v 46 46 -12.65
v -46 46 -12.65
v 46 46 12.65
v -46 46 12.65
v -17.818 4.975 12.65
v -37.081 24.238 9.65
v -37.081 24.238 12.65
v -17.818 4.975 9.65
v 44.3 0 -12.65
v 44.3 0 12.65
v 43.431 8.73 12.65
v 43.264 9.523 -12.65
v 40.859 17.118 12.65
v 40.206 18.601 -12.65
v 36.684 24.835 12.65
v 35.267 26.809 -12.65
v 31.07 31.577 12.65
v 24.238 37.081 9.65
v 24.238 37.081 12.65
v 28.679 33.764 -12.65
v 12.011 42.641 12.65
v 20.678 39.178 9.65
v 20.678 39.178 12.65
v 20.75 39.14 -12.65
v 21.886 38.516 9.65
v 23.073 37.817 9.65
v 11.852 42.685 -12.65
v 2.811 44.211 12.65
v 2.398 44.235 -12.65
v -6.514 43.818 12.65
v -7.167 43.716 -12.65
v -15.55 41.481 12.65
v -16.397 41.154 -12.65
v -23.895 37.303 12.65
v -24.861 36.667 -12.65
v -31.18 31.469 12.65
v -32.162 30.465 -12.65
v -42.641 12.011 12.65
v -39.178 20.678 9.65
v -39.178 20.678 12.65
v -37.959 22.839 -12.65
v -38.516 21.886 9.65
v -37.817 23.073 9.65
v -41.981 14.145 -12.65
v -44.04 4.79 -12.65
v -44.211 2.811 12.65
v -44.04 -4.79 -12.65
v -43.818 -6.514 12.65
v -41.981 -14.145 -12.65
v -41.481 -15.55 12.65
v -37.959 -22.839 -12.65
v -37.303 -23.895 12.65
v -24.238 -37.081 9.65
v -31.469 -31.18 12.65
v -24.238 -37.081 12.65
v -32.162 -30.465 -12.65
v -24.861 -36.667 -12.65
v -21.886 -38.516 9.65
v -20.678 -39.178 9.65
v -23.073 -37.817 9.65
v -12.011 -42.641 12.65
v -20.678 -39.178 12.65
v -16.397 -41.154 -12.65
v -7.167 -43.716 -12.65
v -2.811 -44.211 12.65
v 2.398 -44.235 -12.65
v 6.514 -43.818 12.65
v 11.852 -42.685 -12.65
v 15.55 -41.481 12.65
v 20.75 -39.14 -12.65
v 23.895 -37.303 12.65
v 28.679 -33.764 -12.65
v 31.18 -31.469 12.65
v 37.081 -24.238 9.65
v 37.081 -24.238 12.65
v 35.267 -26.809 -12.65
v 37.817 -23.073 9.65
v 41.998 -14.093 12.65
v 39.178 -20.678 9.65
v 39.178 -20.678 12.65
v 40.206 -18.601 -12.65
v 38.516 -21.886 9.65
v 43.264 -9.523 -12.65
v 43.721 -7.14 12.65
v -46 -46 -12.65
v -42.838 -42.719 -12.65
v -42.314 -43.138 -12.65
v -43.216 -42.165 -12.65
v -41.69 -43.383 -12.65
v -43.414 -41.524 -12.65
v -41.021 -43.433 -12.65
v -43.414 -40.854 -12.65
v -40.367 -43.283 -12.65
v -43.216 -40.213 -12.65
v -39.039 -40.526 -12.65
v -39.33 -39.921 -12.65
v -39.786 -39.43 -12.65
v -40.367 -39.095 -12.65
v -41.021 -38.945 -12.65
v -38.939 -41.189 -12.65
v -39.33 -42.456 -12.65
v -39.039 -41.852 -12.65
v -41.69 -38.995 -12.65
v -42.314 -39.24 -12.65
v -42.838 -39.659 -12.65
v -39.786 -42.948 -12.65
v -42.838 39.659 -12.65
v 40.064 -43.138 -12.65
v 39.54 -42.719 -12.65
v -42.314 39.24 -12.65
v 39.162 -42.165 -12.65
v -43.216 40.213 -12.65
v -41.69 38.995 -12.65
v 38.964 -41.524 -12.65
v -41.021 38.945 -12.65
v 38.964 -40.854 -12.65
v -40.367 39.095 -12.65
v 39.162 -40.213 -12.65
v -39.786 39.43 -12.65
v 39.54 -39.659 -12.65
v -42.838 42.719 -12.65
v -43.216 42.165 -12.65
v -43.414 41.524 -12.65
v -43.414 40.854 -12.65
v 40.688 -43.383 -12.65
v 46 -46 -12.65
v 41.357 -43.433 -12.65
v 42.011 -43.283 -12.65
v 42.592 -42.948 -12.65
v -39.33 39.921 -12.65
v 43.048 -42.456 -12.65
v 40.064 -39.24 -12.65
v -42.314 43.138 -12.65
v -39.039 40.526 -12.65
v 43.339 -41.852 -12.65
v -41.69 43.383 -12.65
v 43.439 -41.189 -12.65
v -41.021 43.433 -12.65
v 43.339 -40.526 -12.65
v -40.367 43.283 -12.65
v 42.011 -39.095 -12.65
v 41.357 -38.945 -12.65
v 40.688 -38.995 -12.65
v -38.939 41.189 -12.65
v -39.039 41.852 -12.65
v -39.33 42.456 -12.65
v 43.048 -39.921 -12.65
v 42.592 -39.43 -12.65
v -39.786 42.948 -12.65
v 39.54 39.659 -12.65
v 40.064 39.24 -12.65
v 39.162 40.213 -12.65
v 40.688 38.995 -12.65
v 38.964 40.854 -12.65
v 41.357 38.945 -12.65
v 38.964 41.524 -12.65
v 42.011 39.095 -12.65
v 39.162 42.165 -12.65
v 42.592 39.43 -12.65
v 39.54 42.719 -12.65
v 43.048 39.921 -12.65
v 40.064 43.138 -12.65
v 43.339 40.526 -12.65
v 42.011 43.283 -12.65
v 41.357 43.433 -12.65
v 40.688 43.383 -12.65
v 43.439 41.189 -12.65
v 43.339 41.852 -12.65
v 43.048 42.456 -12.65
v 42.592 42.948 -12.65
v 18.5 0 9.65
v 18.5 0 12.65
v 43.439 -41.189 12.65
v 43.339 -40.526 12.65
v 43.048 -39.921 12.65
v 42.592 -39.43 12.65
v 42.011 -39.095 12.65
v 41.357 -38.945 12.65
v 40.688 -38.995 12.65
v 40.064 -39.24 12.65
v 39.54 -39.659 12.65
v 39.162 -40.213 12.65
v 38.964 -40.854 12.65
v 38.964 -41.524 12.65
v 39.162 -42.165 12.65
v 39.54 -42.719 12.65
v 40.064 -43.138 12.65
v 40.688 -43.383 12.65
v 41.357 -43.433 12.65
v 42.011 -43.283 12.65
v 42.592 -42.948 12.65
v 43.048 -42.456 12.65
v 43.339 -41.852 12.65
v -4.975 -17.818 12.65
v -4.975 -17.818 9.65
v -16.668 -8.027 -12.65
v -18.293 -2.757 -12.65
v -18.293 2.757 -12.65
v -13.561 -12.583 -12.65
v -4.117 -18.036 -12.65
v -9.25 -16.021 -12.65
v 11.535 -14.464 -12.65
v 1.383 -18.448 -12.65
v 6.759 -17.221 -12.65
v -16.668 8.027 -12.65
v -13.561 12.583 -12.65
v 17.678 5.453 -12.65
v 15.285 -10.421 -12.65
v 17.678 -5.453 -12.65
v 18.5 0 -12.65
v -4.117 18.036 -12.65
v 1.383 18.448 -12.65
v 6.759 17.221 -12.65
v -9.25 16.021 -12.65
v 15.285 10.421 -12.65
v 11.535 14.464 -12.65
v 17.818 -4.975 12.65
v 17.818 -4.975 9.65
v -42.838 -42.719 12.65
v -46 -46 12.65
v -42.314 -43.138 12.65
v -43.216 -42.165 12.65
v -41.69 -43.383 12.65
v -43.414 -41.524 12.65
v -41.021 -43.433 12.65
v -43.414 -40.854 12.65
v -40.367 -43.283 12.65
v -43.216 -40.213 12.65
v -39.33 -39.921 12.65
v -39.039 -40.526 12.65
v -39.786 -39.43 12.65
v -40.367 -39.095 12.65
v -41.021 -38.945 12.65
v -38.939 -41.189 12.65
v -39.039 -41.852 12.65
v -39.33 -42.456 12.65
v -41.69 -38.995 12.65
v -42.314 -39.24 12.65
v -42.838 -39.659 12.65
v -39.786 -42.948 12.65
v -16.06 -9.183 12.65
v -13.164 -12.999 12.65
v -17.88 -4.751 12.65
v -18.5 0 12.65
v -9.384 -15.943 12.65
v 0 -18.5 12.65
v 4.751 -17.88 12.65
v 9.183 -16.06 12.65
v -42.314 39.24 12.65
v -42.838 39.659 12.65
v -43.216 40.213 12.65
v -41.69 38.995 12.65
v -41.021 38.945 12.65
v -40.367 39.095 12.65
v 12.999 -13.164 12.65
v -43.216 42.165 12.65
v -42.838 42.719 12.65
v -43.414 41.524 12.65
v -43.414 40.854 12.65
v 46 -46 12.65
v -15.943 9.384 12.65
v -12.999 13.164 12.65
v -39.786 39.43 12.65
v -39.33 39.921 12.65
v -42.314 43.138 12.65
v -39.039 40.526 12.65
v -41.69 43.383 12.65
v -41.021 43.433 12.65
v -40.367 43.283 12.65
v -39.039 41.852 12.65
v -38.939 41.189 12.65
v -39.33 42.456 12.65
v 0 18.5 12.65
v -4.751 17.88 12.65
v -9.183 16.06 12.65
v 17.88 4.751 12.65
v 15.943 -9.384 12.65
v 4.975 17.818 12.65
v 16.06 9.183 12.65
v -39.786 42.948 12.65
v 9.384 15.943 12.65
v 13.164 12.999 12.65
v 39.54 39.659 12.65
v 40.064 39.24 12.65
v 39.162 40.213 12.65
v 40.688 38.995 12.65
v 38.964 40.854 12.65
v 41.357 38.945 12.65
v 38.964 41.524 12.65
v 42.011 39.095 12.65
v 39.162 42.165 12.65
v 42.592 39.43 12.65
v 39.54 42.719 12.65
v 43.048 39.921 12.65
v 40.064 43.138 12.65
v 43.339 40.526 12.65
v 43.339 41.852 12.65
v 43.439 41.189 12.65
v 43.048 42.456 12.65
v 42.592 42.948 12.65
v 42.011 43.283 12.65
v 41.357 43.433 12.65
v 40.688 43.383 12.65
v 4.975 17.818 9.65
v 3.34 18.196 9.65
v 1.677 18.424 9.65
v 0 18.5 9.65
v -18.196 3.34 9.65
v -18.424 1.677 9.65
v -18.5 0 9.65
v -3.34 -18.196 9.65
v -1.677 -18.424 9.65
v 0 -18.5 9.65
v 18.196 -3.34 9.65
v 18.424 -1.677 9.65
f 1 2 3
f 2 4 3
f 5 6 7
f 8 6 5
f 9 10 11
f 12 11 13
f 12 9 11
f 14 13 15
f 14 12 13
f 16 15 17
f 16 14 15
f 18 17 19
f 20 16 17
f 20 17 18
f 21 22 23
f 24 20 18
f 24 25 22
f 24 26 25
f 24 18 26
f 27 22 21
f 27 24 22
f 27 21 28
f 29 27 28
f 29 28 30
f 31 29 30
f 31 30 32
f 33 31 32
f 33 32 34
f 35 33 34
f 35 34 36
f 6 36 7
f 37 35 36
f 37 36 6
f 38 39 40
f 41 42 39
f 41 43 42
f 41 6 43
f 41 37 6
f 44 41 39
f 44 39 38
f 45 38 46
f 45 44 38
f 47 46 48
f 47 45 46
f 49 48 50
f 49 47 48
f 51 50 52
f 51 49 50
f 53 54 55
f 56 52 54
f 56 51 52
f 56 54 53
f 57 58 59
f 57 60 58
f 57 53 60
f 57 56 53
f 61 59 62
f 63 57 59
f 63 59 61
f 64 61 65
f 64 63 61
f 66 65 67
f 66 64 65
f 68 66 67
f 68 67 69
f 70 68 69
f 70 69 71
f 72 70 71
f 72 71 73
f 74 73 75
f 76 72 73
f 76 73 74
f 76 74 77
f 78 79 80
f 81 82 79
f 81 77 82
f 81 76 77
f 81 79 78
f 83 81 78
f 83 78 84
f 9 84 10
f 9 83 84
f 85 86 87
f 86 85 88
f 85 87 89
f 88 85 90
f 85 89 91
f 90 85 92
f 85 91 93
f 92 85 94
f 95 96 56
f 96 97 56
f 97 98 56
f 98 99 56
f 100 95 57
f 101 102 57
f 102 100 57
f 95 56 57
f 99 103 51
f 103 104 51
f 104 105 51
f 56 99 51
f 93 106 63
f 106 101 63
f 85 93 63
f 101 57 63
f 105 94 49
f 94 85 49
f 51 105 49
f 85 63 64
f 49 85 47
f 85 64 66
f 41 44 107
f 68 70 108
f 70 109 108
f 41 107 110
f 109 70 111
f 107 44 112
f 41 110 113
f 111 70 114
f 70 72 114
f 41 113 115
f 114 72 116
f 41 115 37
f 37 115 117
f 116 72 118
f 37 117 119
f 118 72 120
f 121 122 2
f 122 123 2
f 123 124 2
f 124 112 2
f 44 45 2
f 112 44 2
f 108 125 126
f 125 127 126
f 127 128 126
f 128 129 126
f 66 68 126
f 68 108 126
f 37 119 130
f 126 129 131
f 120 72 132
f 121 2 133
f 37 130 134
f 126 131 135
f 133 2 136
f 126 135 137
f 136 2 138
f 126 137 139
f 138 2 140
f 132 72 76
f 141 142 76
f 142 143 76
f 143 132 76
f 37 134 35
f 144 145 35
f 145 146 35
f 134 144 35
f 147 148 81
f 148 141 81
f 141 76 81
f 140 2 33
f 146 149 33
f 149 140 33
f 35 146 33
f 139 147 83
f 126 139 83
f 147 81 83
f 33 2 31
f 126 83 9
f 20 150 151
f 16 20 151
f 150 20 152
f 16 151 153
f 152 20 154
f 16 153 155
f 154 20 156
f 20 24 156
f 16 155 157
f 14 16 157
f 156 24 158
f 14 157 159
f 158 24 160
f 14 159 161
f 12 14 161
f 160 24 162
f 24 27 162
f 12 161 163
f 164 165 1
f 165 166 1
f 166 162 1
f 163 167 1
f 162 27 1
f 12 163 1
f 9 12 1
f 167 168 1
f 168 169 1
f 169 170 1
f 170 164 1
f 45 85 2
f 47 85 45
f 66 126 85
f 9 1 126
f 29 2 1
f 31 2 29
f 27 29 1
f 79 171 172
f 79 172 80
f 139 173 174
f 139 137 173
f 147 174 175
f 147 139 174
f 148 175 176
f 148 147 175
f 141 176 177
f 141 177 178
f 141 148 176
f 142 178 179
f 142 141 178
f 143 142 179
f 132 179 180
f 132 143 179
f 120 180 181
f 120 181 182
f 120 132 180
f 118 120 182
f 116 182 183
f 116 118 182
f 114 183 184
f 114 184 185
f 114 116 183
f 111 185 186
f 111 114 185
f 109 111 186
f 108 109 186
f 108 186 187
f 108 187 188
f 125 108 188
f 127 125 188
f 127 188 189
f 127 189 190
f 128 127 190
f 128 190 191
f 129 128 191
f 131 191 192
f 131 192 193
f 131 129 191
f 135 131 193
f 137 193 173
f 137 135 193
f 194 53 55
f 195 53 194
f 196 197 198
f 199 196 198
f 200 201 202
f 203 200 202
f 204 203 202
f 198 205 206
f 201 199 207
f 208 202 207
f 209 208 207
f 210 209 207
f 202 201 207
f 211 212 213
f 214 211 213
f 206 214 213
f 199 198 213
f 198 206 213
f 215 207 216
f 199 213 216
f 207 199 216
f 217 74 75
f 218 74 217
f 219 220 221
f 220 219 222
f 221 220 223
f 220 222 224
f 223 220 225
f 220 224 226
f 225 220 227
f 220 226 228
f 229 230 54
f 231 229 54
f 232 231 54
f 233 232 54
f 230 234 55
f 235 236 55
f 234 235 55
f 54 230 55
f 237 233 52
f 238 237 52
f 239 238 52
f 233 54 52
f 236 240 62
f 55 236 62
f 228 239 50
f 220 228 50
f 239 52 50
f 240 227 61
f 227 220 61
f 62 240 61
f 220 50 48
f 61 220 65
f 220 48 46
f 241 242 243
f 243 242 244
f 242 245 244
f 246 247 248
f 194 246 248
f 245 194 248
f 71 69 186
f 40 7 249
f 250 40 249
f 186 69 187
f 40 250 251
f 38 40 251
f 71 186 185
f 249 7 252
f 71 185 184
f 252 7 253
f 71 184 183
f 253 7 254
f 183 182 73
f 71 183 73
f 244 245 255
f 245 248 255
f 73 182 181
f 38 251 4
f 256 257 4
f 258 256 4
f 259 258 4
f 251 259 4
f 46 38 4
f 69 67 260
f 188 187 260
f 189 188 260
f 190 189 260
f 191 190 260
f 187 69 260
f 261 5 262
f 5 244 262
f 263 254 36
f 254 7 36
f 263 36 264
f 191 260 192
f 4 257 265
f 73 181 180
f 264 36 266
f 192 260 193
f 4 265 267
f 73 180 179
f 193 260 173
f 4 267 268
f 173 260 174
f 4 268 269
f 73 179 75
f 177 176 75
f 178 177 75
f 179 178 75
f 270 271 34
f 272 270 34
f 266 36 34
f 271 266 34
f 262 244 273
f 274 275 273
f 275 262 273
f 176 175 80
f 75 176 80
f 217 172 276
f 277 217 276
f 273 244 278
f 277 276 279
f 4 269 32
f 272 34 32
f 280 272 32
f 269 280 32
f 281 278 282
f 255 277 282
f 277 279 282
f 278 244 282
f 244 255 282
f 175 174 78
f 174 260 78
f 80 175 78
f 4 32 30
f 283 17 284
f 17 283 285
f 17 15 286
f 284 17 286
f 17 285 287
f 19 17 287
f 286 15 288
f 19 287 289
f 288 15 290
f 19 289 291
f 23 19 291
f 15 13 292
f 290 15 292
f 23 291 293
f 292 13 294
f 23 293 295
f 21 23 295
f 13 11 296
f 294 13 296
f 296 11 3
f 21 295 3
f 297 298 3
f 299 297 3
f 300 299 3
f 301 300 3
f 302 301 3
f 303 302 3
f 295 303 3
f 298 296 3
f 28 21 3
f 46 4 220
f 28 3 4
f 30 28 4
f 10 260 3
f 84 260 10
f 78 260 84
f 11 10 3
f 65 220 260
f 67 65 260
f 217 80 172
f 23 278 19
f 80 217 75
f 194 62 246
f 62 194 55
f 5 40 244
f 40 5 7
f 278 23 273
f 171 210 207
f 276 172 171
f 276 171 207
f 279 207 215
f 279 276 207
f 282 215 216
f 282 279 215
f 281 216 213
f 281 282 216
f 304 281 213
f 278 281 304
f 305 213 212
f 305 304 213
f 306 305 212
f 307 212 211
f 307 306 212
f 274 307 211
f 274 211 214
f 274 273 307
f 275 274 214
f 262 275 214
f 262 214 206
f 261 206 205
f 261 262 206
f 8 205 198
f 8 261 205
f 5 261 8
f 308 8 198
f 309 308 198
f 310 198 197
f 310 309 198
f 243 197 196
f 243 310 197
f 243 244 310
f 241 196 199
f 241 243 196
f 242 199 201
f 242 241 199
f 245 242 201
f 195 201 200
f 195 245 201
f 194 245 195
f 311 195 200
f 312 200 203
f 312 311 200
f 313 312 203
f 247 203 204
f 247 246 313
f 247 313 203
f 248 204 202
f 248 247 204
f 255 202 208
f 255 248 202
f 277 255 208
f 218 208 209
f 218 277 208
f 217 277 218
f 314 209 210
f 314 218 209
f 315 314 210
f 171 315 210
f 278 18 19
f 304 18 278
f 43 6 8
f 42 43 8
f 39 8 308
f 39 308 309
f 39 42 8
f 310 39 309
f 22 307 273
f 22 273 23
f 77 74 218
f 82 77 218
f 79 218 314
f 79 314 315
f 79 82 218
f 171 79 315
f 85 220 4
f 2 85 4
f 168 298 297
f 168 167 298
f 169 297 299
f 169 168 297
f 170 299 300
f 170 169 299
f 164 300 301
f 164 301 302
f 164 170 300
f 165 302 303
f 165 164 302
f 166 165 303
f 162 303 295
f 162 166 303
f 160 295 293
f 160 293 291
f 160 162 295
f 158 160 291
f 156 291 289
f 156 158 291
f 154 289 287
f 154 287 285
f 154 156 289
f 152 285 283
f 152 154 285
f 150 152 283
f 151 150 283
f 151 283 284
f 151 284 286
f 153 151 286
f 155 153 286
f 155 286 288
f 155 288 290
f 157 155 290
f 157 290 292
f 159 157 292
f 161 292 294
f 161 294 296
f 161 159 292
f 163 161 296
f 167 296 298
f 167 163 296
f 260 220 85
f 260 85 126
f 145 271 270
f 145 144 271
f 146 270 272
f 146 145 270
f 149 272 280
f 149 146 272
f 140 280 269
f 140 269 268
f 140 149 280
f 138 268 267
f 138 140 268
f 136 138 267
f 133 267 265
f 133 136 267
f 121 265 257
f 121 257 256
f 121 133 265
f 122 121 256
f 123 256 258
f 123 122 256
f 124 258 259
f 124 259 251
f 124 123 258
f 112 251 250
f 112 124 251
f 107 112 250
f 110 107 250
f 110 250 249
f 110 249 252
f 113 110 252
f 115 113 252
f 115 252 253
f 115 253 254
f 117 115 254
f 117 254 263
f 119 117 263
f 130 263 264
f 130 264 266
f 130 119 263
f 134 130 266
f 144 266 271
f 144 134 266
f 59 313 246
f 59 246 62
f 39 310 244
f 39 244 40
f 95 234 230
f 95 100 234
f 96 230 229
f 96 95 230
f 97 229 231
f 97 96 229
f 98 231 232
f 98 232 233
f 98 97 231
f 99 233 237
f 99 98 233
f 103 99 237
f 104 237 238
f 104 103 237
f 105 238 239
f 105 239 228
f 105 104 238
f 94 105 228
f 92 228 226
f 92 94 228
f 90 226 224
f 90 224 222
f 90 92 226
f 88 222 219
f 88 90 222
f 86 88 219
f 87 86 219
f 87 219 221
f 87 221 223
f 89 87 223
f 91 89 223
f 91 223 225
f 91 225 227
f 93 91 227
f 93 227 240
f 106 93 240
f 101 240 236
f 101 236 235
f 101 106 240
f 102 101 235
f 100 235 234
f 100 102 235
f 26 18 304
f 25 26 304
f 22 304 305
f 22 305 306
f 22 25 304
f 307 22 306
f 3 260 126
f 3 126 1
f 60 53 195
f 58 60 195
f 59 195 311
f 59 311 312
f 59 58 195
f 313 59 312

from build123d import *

# Parameters (mm, degrees)
SKETCH1_W             = 92
SKETCH1_H             = 92
SKETCH1_R             = 44.3
SKETCH1_R_2           = 2.25
BOSS_EXTRUDE1_DEPTH   = 12.65
SKETCH1_R_3           = 18.5
BOSS_EXTRUDE1_2_DEPTH = 12.65
BOSS_EXTRUDE2_START   = -3
BOSS_EXTRUDE2_DEPTH   = 3
CIRPATTERN1_COUNT     = 4


with BuildPart() as part:
    # Sketch1 → Boss-Extrude1 (new, symmetric)
    with BuildSketch(Plane.XY):
        Rectangle(SKETCH1_W, SKETCH1_H)
        Circle(SKETCH1_R, mode=Mode.SUBTRACT)
        with Locations((-41.188970004, -41.188970004)):
            Circle(SKETCH1_R_2, mode=Mode.SUBTRACT)
        with Locations((41.188970004, -41.188970004)):
            Circle(SKETCH1_R_2, mode=Mode.SUBTRACT)
        with Locations((41.188970004, 41.188970004)):
            Circle(SKETCH1_R_2, mode=Mode.SUBTRACT)
        with Locations((-41.188970004, 41.188970004)):
            Circle(SKETCH1_R_2, mode=Mode.SUBTRACT)
    extrude(amount=BOSS_EXTRUDE1_DEPTH, both=True)



with BuildPart() as body_2:
    # Sketch1 → Boss-Extrude1 2 (new, symmetric)
    with BuildSketch(Plane.XY):
        Circle(SKETCH1_R_3)
    extrude(amount=BOSS_EXTRUDE1_2_DEPTH, both=True)


with BuildPart() as part_1:
    add(part.part)

    add(body_2.part)  # Boss-Extrude2 merges body 2
    # Sketch2 → Boss-Extrude2 (add)
    with BuildSketch(Plane.XY.offset(12.65).offset(BOSS_EXTRUDE2_START)):
        with BuildLine():
            Line((0, 18.5), (20.677955159, 39.177955159))
            ThreePointArc((20.677955159, 39.177955159), (22.482427755, 38.171068131), (24.237983576, 37.081129327))
            Line((24.237983576, 37.081129327), (4.975286421, 17.818432171))
            ThreePointArc((4.975286421, 17.818432171), (2.510876823, 18.328816044), (0, 18.5))
        make_face()
    boss_extrude2 = extrude(amount=BOSS_EXTRUDE2_DEPTH)

    # CirPattern1: Boss-Extrude2 ×4 about axis
    cirpattern1_axis = Axis((0, 0, 0), (0, 0, 1))
    for i in range(1, CIRPATTERN1_COUNT):
        add(boss_extrude2.rotate(cirpattern1_axis, i * 360 / CIRPATTERN1_COUNT))


solid = part_1.part
